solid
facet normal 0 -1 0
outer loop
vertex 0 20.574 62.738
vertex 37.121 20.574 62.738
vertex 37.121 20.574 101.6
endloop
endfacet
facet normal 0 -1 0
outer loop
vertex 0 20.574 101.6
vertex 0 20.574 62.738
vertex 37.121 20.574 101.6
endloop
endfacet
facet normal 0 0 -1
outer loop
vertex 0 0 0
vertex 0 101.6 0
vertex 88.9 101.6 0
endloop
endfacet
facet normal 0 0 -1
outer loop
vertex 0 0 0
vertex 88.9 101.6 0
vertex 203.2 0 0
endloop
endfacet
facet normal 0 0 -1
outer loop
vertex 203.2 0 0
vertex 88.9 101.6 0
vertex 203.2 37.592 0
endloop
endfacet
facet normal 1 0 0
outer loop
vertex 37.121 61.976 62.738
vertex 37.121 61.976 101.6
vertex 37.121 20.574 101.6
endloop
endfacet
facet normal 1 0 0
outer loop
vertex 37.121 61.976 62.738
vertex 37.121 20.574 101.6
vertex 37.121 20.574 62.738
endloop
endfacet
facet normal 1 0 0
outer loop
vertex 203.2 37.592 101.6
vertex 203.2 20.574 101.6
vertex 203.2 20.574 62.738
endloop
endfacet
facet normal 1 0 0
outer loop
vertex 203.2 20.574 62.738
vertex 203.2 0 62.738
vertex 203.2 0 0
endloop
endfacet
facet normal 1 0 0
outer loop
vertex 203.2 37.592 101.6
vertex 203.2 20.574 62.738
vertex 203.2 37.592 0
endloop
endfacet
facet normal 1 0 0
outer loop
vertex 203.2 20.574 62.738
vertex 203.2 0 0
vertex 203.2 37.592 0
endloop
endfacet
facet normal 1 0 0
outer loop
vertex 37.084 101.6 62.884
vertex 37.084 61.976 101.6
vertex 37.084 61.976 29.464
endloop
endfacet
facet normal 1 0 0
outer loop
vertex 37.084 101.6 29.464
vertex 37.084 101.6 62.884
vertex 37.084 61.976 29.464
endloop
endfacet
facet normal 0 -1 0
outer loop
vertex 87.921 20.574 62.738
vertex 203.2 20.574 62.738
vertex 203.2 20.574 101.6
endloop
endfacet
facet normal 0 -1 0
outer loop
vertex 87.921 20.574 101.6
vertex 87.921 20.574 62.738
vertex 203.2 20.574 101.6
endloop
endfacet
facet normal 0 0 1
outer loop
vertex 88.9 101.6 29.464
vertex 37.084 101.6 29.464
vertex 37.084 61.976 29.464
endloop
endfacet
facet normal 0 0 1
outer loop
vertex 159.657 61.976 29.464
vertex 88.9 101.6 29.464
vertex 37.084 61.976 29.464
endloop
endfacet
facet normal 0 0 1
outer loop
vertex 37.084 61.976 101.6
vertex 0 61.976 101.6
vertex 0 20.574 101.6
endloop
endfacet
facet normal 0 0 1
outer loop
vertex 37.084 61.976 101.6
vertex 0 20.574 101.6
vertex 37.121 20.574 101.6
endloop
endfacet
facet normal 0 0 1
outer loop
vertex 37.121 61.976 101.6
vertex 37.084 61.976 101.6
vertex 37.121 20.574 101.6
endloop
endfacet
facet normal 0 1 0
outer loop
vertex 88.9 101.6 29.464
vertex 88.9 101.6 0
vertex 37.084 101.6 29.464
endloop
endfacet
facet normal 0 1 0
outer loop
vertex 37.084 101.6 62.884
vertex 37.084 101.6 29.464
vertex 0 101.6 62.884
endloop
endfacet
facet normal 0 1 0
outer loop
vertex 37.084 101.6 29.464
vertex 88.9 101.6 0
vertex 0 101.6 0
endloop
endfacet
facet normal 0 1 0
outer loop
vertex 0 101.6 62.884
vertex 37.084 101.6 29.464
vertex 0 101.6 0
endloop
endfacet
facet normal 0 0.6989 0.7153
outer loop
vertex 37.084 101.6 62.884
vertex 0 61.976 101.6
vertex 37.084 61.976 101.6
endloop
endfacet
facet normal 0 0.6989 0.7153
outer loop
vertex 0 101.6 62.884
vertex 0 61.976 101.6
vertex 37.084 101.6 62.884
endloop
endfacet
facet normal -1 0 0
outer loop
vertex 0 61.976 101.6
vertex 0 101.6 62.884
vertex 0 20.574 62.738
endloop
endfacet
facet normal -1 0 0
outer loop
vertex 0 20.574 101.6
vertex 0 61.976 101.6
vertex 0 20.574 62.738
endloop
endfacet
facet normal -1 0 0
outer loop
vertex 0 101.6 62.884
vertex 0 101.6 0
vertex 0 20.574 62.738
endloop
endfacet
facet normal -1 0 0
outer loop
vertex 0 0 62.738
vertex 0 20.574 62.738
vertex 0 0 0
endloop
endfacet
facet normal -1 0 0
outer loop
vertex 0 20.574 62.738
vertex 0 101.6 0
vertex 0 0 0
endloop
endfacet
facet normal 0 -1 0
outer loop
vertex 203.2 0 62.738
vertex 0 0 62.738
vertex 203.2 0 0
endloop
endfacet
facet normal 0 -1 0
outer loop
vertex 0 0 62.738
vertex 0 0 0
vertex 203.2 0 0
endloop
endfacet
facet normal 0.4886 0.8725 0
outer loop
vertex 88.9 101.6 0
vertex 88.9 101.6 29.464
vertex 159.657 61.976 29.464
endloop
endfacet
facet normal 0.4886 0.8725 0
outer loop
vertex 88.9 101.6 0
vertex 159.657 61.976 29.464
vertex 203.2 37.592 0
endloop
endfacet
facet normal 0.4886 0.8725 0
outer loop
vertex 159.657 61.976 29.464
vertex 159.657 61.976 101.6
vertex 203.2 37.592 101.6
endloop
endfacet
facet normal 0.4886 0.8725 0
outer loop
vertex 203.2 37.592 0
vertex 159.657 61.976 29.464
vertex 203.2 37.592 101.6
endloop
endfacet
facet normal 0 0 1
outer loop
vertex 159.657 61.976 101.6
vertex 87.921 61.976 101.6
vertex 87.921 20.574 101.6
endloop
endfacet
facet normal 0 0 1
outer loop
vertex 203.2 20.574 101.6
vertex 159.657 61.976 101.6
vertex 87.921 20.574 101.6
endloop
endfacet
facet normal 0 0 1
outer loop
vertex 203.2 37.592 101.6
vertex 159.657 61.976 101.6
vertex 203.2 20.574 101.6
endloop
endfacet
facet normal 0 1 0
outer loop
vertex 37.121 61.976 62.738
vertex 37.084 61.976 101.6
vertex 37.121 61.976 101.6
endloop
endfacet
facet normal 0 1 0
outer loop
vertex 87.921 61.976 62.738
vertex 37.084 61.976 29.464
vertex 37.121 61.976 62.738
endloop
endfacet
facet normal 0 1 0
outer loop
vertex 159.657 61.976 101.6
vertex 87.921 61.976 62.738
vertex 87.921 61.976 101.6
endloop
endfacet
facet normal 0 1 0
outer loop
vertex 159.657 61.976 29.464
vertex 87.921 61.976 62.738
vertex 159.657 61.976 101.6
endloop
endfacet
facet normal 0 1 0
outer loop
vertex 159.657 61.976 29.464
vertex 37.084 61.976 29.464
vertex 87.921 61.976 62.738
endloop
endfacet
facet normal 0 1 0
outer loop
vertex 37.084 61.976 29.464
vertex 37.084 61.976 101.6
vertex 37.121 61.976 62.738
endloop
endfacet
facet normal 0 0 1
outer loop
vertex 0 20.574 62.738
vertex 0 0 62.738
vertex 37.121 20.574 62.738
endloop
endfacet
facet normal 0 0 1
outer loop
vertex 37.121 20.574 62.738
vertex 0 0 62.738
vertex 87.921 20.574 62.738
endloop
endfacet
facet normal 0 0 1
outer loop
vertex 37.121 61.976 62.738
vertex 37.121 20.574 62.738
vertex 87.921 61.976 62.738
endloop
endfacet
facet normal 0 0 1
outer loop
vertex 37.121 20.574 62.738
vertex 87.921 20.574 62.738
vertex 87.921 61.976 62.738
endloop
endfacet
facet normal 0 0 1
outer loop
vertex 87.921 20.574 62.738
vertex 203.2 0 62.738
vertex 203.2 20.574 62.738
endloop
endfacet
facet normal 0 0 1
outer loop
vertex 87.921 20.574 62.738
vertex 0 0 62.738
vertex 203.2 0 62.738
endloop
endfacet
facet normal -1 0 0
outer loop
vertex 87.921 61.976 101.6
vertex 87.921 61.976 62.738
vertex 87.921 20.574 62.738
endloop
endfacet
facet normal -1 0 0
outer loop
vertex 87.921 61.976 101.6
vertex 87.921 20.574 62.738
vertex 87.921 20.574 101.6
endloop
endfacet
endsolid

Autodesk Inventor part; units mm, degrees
ref_plane "YZ Plane" through (0, 0, 0) normal (1, 0, 0) x (0, 1, 0)
ref_plane "XZ Plane" through (0, 0, 0) normal (0, 1, 0) x (-1, 0, 0)
ref_plane "XY Plane" through (0, 0, 0) normal (0, 0, 1) x (1, 0, 0)
sketch "Sketch1" plane through (0, 0, 0) normal (0, 0, 1) x (1, 0, 0)
  line L0 (0, 0) -> (203.2, 0)
  line L1 (203.2, 0) -> (203.2, 101.6)
  line L2 (203.2, 101.6) -> (0, 101.6)
  line L3 (0, 101.6) -> (0, 0)
  dimension "d0" = 203.2
  dimension "d1" = 101.6
extrude "Extrusion1" add sketch "Sketch1" along normal blind 101.6
sketch "Sketch2" plane through (203.2, 0, 0) normal (1, 0, 0) x (0, 0, -1)
  line L0 (0, 0) -> (-101.6, 0) projected
  line L1 (-101.6, 0) -> (-62.738, 0)
  line L2 (-62.738, 0) -> (-101.6, 0)
  line L3 (-62.738, 0) -> (-62.738, 20.574)
  line L4 (-62.738, 20.574) -> (-101.6, 20.574)
  line L5 (-101.6, 0) -> (-101.6, 101.6) projected
  line L6 (-101.6, 20.574) -> (-101.6, 0)
  dimension "d4" = 38.862
  dimension "d5" = 20.574
extrude "Extrusion2" cut sketch "Sketch2" against normal blind 203.2
sketch "Sketch3" plane through (0, 101.6, 0) normal (0, 1, 0) x (1, 0, 0)
  line L0 (0, 0) -> (0, -101.6) projected
  line L1 (0, -101.6) -> (37.084, -101.6)
  line L2 (203.2, -101.6) -> (0, -101.6) projected
  line L3 (37.084, -101.6) -> (37.084, -29.464)
  line L4 (37.084, -29.464) -> (159.766, -29.464)
  line L5 (159.766, -29.464) -> (159.766, -101.6)
  dimension "d8" = 37.084
  dimension "d9" = 72.136
  dimension "d10" = 122.682
sketch "Sketch4" plane through (0, 101.6, 0) normal (0, 1, 0) x (1, 0, 0)
  line L0 (203.2, -101.6) -> (0, -101.6) projected
  line L1 (37.1206, -101.6) -> (-1.7414, -101.6)
  line L2 (37.1206, -101.6) -> (37.1206, -62.738)
  line L3 (37.1206, -62.738) -> (87.9206, -62.738)
  line L4 (203.2, -62.738) -> (0, -62.738) projected
  line L5 (87.9206, -62.738) -> (87.9206, -101.6)
  point P0 (0, 0)
  dimension "d11" = 38.862
  dimension "d12" = 38.862
  dimension "d13" = 50.8
extrude "Extrusion3" cut sketch "Sketch4" against normal blind 203.2
extrude "Extrusion4" cut sketch "Sketch3" against normal blind 39.624
sketch "Sketch5" plane through (0, 0, 101.6) normal (0, 0, 1) x (1, 0, 0)
  line L0 (203.2, 20.574) -> (203.2, 101.6) projected
  line L1 (203.2, 101.6) -> (203.2, 37.592)
  line L2 (203.2, 37.592) -> (203.2, 101.6)
  line L3 (203.2, 101.6) -> (88.9, 101.6)
  line L4 (203.2, 101.6) -> (0, 101.6) projected
  line L5 (88.9, 101.6) -> (203.2, 37.592)
  point P0 (0, 0)
  dimension "d18" = 64.008
  dimension "d19" = 114.3
extrude "Extrusion5" cut sketch "Sketch5" against normal blind 101.6
sketch "Sketch6" plane through (0, 0, 101.6) normal (0, 0, 1) x (1, 0, 0)
  point P0 (0, 0)
sketch "Sketch7" plane through (0, 101.6, 101.6) normal (0, 1, 0) x (1, 0, 0)
  line L0 (37.084, 0) -> (0, 0) projected
  line L1 (0, 0) -> (0, 38.862)
  line L2 (0, 101.6) -> (0, 0) projected
  dimension "d22" = 38.862
sketch "Sketch8" plane through (0, 0, 0) normal (-1, 0, 0) x (0, 0, 1)
  point P0 (0, 0)
sketch "Sketch9" plane through (0, 0, 0) normal (-1, 0, 0) x (0, 0, 1)
  line L0 (101.6, 101.6) -> (101.6, 20.574) projected
  line L1 (101.6, 101.6) -> (101.6, 61.976)
  line L2 (101.6, 61.976) -> (62.8835, 101.6)
  line L3 (101.6, 101.6) -> (29.464, 101.6) projected
  line L4 (62.8835, 101.6) -> (101.6, 101.6)
  point P0 (0, 0)
  dimension "d23" = 39.624
extrude "Extrusion6" cut sketch "Sketch9" against normal blind 101.6
properties part number "orthographic4"
